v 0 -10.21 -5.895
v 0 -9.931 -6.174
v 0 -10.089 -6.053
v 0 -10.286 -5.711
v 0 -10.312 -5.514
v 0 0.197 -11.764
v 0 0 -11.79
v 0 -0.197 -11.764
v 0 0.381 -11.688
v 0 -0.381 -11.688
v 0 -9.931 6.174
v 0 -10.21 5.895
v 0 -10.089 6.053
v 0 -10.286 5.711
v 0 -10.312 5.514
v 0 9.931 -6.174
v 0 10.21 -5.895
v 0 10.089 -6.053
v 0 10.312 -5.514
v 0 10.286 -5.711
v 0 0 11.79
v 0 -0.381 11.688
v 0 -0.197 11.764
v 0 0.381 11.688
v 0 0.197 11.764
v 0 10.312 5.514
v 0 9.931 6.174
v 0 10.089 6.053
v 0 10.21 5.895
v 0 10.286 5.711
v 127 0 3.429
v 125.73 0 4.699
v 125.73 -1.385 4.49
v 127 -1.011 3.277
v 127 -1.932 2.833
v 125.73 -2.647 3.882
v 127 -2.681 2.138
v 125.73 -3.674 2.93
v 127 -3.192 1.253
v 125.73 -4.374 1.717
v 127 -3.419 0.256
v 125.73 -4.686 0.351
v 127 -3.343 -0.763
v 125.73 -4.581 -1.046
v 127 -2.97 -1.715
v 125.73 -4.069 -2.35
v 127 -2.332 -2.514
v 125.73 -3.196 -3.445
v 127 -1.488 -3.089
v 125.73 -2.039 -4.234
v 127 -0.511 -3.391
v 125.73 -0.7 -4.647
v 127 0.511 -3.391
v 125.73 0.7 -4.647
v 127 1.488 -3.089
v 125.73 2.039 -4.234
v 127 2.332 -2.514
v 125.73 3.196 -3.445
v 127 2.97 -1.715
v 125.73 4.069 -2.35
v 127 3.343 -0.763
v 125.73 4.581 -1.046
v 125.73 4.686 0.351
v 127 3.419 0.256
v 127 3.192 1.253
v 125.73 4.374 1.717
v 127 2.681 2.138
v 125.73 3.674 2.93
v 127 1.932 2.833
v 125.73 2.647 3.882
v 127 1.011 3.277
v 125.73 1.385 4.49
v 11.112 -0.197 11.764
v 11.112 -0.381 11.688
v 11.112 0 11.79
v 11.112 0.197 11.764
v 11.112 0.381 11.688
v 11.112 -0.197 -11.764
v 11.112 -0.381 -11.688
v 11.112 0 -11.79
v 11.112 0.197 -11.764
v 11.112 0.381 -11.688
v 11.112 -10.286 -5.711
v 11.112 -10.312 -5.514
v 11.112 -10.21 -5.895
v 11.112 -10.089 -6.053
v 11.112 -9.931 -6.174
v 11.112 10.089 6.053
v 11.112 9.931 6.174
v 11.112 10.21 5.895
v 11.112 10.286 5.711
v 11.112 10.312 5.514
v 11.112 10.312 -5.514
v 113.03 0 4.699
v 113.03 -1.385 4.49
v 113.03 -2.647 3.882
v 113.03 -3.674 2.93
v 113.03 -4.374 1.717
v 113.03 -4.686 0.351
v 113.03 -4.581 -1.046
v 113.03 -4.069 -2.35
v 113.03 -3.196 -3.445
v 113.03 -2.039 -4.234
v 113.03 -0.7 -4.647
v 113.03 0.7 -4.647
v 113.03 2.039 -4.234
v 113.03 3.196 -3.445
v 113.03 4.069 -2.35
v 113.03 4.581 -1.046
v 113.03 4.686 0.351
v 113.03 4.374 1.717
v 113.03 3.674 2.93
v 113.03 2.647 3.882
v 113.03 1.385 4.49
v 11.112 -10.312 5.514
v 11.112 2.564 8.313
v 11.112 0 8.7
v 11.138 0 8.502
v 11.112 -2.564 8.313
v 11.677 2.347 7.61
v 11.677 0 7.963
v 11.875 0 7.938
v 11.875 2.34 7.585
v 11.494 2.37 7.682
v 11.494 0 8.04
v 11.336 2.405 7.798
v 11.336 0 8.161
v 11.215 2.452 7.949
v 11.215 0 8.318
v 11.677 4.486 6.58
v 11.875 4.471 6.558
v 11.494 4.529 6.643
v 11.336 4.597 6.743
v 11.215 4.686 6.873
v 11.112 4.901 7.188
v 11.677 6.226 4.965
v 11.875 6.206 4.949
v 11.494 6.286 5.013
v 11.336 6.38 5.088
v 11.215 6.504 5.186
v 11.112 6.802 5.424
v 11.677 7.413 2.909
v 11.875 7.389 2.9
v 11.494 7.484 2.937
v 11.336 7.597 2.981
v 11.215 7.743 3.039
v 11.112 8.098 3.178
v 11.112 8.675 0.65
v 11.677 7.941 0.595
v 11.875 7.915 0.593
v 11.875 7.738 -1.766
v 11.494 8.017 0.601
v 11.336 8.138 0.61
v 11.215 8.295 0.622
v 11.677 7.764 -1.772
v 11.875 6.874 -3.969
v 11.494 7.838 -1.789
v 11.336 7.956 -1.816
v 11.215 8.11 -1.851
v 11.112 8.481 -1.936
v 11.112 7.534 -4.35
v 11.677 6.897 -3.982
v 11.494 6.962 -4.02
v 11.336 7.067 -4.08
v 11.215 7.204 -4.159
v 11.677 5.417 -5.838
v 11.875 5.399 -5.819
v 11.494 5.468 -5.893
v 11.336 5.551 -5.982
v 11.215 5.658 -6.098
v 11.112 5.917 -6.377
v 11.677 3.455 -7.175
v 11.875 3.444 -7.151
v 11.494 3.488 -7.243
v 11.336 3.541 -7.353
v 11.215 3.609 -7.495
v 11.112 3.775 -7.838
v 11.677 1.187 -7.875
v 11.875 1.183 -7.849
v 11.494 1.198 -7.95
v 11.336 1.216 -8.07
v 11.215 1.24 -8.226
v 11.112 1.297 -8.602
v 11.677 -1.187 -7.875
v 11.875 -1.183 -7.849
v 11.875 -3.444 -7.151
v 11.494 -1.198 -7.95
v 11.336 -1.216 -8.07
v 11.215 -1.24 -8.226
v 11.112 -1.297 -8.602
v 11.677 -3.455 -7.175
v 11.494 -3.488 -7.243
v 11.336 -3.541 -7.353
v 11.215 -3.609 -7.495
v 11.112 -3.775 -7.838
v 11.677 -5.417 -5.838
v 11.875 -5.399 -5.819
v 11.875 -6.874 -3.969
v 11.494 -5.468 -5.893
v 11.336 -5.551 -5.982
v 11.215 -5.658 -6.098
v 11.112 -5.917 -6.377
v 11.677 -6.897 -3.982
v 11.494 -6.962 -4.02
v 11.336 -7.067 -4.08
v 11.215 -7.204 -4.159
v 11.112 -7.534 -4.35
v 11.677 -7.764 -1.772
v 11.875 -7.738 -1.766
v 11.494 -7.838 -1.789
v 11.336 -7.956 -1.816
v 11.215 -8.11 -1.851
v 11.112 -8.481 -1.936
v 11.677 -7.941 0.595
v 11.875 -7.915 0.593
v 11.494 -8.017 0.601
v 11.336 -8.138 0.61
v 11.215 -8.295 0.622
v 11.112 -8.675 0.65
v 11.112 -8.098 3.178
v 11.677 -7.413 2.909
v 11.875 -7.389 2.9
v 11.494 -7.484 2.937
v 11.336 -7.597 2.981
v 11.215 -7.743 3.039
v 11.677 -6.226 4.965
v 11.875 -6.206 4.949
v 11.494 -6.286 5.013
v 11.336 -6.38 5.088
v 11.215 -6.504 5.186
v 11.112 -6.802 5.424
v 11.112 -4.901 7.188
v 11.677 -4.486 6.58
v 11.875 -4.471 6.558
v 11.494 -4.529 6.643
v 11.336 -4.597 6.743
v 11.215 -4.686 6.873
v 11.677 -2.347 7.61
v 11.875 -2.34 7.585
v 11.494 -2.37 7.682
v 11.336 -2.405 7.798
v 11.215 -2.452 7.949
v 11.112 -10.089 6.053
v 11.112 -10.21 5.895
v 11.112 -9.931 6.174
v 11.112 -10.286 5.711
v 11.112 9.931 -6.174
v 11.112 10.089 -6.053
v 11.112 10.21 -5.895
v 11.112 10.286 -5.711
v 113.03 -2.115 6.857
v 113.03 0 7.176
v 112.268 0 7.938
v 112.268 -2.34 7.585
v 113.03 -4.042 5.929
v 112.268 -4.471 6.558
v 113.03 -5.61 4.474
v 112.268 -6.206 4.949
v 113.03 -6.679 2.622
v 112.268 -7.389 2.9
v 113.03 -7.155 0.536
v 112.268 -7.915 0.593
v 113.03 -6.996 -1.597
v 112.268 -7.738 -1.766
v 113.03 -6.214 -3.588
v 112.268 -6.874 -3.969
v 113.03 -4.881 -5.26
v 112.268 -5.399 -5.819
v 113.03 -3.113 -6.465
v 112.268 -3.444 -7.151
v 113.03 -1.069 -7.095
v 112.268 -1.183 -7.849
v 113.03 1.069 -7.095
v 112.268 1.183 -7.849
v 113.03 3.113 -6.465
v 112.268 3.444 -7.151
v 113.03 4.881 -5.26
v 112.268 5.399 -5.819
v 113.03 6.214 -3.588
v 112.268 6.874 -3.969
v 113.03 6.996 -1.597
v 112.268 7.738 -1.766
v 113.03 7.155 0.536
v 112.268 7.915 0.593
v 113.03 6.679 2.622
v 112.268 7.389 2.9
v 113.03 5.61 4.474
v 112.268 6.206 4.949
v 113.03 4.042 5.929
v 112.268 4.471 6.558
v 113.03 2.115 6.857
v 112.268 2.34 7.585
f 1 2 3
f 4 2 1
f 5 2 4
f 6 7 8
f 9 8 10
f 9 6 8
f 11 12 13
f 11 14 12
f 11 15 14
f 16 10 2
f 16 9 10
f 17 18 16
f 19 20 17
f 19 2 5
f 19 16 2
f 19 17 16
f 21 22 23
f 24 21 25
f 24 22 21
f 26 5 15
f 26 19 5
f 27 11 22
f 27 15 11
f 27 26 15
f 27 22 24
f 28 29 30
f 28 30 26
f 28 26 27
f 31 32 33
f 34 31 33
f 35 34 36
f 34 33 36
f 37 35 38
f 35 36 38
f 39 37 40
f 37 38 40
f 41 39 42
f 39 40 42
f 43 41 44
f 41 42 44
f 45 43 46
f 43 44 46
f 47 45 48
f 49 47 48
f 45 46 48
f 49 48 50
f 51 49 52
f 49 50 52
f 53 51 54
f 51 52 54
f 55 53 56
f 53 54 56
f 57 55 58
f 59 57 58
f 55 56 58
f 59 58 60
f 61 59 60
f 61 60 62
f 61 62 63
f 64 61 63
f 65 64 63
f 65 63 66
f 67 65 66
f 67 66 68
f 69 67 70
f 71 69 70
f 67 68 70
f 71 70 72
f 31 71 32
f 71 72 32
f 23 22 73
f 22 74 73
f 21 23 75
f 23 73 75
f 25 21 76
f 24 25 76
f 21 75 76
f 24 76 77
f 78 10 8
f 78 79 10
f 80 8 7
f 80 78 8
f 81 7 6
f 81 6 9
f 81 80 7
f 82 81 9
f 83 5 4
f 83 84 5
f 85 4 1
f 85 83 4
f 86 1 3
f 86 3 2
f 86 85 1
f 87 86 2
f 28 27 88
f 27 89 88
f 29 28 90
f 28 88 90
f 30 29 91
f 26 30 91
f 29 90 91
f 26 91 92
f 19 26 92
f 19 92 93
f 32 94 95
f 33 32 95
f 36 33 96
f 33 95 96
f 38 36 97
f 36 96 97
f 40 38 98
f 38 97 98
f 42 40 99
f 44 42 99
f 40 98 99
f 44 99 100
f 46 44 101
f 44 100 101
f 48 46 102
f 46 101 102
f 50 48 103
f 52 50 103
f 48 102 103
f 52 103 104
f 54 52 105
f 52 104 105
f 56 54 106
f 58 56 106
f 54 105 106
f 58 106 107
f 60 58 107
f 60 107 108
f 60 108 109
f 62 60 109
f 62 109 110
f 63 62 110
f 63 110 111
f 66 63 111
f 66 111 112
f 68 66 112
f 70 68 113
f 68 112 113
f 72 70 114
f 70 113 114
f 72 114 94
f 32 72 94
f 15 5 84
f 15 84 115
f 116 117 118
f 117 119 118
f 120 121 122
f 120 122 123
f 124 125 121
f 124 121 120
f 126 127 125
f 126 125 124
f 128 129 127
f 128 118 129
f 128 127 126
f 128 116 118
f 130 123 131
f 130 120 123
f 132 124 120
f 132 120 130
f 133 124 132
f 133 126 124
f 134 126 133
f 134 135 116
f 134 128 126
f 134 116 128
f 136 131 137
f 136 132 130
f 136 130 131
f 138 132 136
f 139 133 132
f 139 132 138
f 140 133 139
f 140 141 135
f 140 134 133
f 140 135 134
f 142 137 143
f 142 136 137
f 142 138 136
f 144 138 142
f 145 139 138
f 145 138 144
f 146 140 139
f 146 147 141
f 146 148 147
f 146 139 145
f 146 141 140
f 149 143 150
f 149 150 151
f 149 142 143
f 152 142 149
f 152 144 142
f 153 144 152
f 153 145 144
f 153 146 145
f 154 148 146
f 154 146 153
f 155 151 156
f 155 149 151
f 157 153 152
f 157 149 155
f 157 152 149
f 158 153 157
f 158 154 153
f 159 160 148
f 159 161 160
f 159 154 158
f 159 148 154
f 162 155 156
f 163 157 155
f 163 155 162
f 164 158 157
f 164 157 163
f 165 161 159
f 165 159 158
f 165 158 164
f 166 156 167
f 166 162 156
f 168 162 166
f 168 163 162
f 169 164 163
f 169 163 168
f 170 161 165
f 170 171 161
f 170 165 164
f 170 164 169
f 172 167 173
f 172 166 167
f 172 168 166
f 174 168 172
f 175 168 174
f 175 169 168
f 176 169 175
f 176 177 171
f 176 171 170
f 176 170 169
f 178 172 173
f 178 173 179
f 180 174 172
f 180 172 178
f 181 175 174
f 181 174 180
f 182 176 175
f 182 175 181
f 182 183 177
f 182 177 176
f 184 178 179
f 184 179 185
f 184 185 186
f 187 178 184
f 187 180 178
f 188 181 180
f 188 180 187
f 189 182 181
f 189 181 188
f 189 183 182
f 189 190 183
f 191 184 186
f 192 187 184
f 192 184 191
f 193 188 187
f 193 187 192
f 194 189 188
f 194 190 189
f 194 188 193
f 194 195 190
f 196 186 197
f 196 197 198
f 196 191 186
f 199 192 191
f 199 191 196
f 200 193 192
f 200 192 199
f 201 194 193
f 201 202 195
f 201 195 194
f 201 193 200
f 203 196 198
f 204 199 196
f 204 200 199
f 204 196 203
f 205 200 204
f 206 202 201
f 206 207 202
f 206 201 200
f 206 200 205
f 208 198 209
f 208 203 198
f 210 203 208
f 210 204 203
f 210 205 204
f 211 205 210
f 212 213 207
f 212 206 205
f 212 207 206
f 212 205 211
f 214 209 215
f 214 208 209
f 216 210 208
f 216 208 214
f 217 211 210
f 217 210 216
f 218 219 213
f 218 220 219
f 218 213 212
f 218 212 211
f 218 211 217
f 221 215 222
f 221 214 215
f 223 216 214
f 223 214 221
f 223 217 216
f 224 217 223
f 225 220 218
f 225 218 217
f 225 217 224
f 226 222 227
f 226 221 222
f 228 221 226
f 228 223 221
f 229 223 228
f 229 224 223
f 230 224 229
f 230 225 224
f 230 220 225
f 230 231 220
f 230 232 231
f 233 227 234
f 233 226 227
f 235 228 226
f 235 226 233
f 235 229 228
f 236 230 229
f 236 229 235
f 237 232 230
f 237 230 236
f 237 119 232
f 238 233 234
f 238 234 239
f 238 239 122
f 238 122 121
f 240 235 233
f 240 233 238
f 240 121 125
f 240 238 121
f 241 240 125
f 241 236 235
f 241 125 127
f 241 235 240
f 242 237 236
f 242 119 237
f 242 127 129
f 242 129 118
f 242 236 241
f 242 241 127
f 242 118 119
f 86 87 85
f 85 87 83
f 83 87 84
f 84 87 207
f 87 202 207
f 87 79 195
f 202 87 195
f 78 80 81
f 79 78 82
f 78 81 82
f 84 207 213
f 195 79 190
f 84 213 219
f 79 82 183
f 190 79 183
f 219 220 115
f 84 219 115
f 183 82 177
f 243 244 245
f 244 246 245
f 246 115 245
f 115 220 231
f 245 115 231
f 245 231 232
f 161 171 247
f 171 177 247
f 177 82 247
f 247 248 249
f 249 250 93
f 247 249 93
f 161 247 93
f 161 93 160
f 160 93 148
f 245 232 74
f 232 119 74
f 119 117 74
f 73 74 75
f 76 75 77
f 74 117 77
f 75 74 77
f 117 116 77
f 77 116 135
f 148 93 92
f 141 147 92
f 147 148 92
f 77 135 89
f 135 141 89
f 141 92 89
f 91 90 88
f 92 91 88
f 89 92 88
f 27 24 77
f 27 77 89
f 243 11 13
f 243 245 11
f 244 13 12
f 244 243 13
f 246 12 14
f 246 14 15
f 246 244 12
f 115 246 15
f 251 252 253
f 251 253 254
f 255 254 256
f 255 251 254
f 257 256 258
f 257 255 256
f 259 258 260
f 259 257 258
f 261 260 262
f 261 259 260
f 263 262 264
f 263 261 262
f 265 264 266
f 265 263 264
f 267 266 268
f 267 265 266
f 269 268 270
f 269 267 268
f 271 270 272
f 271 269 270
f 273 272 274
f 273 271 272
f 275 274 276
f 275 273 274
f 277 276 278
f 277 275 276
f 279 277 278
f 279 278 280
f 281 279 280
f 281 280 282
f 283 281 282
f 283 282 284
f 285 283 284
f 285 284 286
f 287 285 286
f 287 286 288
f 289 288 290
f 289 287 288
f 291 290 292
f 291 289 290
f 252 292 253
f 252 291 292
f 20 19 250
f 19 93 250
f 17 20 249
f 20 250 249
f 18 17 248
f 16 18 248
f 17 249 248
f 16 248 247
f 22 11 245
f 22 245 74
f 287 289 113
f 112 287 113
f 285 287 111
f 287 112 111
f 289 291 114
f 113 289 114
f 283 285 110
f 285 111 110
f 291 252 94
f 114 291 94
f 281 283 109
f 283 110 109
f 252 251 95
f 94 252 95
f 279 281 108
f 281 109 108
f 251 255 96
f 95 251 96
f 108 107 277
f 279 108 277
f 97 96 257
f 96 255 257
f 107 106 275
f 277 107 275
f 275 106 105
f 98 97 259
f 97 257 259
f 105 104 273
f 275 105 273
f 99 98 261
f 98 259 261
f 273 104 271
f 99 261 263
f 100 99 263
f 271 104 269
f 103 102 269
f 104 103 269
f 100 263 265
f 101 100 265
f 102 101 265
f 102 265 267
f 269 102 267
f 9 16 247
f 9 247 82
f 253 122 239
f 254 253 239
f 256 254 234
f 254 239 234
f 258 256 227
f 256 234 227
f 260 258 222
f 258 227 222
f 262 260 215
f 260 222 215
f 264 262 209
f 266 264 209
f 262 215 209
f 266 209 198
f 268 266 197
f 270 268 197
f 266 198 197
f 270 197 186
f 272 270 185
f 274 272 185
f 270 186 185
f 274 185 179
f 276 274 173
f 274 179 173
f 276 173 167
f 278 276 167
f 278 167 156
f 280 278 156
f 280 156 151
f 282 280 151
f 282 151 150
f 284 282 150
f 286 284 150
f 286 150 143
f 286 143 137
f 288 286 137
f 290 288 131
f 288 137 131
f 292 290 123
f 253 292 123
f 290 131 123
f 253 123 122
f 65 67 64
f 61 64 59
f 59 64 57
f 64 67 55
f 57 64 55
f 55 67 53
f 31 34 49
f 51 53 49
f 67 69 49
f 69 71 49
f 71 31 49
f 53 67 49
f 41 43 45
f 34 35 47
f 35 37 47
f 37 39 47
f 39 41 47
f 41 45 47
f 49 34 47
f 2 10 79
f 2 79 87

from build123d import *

# Parameters (mm, degrees)
CHAMFER1_SIZE  = 1.27
SKETCH2_R      = 7.9375
EXTRUDE1_DEPTH = 11.1125
FILLET1_R      = 0.762
CHAMFER2_SIZE  = 0.762
FILLET2_R      = 0.762


with BuildPart() as part:
    # Sketch1 → Revolve1 (revolve)
    with BuildSketch(Plane.XY, mode=Mode.PRIVATE) as revolve1_sk:
        Polygon((127, 0), (127, 4.699), (113.03, 4.699), (113.03, 7.9375), (0, 7.9375), (0, 0), align=None)
    revolve(revolve1_sk.sketch.rotate(Axis((-72.566001994, 0, 0), (1, 0, 0)), 90), axis=Axis((-72.566001994, 0, 0), (1, 0, 0)))  # turned: the seam where the file's is

    # Chamfer1
    chamfer1_edges = [part.edges().sort_by_distance(p)[0] for p in [
        (127, 0, -4.699),
    ]]
    chamfer(chamfer1_edges, length=CHAMFER1_SIZE)

    # Sketch2 → Extrude1 (add)
    with BuildSketch(Plane.ZY):
        Polygon((5.953866916, -10.3124), (11.907733832, 0), (5.953866916, 10.3124), (-5.953866916, 10.3124), (-11.907733832, 0), (-5.953866916, -10.3124), align=None)
        Circle(SKETCH2_R, mode=Mode.SUBTRACT)
    extrude(amount=-EXTRUDE1_DEPTH)

    # Fillet1
    fillet1_edges = [part.edges().sort_by_distance(p)[0] for p in [
        (5.55625, -10.3124, 5.953866916),
        (5.55625, -10.3124, -5.953866916),
        (5.55625, 0, -11.907733832),
        (5.55625, 10.3124, -5.953866916),
        (5.55625, 10.3124, 5.953866916),
        (5.55625, 0, 11.907733832),
    ]]
    fillet(fillet1_edges, radius=FILLET1_R)

    # Chamfer2
    chamfer2_edges = [part.edges().sort_by_distance(p)[0] for p in [
        (113.03, 0, -7.9375),
    ]]
    chamfer(chamfer2_edges, length=CHAMFER2_SIZE)

    # Fillet2
    fillet2_edges = [part.edges().sort_by_distance(p)[0] for p in [
        (11.1125, 0, -7.9375),
    ]]
    fillet(fillet2_edges, radius=FILLET2_R)


solid = part.part
